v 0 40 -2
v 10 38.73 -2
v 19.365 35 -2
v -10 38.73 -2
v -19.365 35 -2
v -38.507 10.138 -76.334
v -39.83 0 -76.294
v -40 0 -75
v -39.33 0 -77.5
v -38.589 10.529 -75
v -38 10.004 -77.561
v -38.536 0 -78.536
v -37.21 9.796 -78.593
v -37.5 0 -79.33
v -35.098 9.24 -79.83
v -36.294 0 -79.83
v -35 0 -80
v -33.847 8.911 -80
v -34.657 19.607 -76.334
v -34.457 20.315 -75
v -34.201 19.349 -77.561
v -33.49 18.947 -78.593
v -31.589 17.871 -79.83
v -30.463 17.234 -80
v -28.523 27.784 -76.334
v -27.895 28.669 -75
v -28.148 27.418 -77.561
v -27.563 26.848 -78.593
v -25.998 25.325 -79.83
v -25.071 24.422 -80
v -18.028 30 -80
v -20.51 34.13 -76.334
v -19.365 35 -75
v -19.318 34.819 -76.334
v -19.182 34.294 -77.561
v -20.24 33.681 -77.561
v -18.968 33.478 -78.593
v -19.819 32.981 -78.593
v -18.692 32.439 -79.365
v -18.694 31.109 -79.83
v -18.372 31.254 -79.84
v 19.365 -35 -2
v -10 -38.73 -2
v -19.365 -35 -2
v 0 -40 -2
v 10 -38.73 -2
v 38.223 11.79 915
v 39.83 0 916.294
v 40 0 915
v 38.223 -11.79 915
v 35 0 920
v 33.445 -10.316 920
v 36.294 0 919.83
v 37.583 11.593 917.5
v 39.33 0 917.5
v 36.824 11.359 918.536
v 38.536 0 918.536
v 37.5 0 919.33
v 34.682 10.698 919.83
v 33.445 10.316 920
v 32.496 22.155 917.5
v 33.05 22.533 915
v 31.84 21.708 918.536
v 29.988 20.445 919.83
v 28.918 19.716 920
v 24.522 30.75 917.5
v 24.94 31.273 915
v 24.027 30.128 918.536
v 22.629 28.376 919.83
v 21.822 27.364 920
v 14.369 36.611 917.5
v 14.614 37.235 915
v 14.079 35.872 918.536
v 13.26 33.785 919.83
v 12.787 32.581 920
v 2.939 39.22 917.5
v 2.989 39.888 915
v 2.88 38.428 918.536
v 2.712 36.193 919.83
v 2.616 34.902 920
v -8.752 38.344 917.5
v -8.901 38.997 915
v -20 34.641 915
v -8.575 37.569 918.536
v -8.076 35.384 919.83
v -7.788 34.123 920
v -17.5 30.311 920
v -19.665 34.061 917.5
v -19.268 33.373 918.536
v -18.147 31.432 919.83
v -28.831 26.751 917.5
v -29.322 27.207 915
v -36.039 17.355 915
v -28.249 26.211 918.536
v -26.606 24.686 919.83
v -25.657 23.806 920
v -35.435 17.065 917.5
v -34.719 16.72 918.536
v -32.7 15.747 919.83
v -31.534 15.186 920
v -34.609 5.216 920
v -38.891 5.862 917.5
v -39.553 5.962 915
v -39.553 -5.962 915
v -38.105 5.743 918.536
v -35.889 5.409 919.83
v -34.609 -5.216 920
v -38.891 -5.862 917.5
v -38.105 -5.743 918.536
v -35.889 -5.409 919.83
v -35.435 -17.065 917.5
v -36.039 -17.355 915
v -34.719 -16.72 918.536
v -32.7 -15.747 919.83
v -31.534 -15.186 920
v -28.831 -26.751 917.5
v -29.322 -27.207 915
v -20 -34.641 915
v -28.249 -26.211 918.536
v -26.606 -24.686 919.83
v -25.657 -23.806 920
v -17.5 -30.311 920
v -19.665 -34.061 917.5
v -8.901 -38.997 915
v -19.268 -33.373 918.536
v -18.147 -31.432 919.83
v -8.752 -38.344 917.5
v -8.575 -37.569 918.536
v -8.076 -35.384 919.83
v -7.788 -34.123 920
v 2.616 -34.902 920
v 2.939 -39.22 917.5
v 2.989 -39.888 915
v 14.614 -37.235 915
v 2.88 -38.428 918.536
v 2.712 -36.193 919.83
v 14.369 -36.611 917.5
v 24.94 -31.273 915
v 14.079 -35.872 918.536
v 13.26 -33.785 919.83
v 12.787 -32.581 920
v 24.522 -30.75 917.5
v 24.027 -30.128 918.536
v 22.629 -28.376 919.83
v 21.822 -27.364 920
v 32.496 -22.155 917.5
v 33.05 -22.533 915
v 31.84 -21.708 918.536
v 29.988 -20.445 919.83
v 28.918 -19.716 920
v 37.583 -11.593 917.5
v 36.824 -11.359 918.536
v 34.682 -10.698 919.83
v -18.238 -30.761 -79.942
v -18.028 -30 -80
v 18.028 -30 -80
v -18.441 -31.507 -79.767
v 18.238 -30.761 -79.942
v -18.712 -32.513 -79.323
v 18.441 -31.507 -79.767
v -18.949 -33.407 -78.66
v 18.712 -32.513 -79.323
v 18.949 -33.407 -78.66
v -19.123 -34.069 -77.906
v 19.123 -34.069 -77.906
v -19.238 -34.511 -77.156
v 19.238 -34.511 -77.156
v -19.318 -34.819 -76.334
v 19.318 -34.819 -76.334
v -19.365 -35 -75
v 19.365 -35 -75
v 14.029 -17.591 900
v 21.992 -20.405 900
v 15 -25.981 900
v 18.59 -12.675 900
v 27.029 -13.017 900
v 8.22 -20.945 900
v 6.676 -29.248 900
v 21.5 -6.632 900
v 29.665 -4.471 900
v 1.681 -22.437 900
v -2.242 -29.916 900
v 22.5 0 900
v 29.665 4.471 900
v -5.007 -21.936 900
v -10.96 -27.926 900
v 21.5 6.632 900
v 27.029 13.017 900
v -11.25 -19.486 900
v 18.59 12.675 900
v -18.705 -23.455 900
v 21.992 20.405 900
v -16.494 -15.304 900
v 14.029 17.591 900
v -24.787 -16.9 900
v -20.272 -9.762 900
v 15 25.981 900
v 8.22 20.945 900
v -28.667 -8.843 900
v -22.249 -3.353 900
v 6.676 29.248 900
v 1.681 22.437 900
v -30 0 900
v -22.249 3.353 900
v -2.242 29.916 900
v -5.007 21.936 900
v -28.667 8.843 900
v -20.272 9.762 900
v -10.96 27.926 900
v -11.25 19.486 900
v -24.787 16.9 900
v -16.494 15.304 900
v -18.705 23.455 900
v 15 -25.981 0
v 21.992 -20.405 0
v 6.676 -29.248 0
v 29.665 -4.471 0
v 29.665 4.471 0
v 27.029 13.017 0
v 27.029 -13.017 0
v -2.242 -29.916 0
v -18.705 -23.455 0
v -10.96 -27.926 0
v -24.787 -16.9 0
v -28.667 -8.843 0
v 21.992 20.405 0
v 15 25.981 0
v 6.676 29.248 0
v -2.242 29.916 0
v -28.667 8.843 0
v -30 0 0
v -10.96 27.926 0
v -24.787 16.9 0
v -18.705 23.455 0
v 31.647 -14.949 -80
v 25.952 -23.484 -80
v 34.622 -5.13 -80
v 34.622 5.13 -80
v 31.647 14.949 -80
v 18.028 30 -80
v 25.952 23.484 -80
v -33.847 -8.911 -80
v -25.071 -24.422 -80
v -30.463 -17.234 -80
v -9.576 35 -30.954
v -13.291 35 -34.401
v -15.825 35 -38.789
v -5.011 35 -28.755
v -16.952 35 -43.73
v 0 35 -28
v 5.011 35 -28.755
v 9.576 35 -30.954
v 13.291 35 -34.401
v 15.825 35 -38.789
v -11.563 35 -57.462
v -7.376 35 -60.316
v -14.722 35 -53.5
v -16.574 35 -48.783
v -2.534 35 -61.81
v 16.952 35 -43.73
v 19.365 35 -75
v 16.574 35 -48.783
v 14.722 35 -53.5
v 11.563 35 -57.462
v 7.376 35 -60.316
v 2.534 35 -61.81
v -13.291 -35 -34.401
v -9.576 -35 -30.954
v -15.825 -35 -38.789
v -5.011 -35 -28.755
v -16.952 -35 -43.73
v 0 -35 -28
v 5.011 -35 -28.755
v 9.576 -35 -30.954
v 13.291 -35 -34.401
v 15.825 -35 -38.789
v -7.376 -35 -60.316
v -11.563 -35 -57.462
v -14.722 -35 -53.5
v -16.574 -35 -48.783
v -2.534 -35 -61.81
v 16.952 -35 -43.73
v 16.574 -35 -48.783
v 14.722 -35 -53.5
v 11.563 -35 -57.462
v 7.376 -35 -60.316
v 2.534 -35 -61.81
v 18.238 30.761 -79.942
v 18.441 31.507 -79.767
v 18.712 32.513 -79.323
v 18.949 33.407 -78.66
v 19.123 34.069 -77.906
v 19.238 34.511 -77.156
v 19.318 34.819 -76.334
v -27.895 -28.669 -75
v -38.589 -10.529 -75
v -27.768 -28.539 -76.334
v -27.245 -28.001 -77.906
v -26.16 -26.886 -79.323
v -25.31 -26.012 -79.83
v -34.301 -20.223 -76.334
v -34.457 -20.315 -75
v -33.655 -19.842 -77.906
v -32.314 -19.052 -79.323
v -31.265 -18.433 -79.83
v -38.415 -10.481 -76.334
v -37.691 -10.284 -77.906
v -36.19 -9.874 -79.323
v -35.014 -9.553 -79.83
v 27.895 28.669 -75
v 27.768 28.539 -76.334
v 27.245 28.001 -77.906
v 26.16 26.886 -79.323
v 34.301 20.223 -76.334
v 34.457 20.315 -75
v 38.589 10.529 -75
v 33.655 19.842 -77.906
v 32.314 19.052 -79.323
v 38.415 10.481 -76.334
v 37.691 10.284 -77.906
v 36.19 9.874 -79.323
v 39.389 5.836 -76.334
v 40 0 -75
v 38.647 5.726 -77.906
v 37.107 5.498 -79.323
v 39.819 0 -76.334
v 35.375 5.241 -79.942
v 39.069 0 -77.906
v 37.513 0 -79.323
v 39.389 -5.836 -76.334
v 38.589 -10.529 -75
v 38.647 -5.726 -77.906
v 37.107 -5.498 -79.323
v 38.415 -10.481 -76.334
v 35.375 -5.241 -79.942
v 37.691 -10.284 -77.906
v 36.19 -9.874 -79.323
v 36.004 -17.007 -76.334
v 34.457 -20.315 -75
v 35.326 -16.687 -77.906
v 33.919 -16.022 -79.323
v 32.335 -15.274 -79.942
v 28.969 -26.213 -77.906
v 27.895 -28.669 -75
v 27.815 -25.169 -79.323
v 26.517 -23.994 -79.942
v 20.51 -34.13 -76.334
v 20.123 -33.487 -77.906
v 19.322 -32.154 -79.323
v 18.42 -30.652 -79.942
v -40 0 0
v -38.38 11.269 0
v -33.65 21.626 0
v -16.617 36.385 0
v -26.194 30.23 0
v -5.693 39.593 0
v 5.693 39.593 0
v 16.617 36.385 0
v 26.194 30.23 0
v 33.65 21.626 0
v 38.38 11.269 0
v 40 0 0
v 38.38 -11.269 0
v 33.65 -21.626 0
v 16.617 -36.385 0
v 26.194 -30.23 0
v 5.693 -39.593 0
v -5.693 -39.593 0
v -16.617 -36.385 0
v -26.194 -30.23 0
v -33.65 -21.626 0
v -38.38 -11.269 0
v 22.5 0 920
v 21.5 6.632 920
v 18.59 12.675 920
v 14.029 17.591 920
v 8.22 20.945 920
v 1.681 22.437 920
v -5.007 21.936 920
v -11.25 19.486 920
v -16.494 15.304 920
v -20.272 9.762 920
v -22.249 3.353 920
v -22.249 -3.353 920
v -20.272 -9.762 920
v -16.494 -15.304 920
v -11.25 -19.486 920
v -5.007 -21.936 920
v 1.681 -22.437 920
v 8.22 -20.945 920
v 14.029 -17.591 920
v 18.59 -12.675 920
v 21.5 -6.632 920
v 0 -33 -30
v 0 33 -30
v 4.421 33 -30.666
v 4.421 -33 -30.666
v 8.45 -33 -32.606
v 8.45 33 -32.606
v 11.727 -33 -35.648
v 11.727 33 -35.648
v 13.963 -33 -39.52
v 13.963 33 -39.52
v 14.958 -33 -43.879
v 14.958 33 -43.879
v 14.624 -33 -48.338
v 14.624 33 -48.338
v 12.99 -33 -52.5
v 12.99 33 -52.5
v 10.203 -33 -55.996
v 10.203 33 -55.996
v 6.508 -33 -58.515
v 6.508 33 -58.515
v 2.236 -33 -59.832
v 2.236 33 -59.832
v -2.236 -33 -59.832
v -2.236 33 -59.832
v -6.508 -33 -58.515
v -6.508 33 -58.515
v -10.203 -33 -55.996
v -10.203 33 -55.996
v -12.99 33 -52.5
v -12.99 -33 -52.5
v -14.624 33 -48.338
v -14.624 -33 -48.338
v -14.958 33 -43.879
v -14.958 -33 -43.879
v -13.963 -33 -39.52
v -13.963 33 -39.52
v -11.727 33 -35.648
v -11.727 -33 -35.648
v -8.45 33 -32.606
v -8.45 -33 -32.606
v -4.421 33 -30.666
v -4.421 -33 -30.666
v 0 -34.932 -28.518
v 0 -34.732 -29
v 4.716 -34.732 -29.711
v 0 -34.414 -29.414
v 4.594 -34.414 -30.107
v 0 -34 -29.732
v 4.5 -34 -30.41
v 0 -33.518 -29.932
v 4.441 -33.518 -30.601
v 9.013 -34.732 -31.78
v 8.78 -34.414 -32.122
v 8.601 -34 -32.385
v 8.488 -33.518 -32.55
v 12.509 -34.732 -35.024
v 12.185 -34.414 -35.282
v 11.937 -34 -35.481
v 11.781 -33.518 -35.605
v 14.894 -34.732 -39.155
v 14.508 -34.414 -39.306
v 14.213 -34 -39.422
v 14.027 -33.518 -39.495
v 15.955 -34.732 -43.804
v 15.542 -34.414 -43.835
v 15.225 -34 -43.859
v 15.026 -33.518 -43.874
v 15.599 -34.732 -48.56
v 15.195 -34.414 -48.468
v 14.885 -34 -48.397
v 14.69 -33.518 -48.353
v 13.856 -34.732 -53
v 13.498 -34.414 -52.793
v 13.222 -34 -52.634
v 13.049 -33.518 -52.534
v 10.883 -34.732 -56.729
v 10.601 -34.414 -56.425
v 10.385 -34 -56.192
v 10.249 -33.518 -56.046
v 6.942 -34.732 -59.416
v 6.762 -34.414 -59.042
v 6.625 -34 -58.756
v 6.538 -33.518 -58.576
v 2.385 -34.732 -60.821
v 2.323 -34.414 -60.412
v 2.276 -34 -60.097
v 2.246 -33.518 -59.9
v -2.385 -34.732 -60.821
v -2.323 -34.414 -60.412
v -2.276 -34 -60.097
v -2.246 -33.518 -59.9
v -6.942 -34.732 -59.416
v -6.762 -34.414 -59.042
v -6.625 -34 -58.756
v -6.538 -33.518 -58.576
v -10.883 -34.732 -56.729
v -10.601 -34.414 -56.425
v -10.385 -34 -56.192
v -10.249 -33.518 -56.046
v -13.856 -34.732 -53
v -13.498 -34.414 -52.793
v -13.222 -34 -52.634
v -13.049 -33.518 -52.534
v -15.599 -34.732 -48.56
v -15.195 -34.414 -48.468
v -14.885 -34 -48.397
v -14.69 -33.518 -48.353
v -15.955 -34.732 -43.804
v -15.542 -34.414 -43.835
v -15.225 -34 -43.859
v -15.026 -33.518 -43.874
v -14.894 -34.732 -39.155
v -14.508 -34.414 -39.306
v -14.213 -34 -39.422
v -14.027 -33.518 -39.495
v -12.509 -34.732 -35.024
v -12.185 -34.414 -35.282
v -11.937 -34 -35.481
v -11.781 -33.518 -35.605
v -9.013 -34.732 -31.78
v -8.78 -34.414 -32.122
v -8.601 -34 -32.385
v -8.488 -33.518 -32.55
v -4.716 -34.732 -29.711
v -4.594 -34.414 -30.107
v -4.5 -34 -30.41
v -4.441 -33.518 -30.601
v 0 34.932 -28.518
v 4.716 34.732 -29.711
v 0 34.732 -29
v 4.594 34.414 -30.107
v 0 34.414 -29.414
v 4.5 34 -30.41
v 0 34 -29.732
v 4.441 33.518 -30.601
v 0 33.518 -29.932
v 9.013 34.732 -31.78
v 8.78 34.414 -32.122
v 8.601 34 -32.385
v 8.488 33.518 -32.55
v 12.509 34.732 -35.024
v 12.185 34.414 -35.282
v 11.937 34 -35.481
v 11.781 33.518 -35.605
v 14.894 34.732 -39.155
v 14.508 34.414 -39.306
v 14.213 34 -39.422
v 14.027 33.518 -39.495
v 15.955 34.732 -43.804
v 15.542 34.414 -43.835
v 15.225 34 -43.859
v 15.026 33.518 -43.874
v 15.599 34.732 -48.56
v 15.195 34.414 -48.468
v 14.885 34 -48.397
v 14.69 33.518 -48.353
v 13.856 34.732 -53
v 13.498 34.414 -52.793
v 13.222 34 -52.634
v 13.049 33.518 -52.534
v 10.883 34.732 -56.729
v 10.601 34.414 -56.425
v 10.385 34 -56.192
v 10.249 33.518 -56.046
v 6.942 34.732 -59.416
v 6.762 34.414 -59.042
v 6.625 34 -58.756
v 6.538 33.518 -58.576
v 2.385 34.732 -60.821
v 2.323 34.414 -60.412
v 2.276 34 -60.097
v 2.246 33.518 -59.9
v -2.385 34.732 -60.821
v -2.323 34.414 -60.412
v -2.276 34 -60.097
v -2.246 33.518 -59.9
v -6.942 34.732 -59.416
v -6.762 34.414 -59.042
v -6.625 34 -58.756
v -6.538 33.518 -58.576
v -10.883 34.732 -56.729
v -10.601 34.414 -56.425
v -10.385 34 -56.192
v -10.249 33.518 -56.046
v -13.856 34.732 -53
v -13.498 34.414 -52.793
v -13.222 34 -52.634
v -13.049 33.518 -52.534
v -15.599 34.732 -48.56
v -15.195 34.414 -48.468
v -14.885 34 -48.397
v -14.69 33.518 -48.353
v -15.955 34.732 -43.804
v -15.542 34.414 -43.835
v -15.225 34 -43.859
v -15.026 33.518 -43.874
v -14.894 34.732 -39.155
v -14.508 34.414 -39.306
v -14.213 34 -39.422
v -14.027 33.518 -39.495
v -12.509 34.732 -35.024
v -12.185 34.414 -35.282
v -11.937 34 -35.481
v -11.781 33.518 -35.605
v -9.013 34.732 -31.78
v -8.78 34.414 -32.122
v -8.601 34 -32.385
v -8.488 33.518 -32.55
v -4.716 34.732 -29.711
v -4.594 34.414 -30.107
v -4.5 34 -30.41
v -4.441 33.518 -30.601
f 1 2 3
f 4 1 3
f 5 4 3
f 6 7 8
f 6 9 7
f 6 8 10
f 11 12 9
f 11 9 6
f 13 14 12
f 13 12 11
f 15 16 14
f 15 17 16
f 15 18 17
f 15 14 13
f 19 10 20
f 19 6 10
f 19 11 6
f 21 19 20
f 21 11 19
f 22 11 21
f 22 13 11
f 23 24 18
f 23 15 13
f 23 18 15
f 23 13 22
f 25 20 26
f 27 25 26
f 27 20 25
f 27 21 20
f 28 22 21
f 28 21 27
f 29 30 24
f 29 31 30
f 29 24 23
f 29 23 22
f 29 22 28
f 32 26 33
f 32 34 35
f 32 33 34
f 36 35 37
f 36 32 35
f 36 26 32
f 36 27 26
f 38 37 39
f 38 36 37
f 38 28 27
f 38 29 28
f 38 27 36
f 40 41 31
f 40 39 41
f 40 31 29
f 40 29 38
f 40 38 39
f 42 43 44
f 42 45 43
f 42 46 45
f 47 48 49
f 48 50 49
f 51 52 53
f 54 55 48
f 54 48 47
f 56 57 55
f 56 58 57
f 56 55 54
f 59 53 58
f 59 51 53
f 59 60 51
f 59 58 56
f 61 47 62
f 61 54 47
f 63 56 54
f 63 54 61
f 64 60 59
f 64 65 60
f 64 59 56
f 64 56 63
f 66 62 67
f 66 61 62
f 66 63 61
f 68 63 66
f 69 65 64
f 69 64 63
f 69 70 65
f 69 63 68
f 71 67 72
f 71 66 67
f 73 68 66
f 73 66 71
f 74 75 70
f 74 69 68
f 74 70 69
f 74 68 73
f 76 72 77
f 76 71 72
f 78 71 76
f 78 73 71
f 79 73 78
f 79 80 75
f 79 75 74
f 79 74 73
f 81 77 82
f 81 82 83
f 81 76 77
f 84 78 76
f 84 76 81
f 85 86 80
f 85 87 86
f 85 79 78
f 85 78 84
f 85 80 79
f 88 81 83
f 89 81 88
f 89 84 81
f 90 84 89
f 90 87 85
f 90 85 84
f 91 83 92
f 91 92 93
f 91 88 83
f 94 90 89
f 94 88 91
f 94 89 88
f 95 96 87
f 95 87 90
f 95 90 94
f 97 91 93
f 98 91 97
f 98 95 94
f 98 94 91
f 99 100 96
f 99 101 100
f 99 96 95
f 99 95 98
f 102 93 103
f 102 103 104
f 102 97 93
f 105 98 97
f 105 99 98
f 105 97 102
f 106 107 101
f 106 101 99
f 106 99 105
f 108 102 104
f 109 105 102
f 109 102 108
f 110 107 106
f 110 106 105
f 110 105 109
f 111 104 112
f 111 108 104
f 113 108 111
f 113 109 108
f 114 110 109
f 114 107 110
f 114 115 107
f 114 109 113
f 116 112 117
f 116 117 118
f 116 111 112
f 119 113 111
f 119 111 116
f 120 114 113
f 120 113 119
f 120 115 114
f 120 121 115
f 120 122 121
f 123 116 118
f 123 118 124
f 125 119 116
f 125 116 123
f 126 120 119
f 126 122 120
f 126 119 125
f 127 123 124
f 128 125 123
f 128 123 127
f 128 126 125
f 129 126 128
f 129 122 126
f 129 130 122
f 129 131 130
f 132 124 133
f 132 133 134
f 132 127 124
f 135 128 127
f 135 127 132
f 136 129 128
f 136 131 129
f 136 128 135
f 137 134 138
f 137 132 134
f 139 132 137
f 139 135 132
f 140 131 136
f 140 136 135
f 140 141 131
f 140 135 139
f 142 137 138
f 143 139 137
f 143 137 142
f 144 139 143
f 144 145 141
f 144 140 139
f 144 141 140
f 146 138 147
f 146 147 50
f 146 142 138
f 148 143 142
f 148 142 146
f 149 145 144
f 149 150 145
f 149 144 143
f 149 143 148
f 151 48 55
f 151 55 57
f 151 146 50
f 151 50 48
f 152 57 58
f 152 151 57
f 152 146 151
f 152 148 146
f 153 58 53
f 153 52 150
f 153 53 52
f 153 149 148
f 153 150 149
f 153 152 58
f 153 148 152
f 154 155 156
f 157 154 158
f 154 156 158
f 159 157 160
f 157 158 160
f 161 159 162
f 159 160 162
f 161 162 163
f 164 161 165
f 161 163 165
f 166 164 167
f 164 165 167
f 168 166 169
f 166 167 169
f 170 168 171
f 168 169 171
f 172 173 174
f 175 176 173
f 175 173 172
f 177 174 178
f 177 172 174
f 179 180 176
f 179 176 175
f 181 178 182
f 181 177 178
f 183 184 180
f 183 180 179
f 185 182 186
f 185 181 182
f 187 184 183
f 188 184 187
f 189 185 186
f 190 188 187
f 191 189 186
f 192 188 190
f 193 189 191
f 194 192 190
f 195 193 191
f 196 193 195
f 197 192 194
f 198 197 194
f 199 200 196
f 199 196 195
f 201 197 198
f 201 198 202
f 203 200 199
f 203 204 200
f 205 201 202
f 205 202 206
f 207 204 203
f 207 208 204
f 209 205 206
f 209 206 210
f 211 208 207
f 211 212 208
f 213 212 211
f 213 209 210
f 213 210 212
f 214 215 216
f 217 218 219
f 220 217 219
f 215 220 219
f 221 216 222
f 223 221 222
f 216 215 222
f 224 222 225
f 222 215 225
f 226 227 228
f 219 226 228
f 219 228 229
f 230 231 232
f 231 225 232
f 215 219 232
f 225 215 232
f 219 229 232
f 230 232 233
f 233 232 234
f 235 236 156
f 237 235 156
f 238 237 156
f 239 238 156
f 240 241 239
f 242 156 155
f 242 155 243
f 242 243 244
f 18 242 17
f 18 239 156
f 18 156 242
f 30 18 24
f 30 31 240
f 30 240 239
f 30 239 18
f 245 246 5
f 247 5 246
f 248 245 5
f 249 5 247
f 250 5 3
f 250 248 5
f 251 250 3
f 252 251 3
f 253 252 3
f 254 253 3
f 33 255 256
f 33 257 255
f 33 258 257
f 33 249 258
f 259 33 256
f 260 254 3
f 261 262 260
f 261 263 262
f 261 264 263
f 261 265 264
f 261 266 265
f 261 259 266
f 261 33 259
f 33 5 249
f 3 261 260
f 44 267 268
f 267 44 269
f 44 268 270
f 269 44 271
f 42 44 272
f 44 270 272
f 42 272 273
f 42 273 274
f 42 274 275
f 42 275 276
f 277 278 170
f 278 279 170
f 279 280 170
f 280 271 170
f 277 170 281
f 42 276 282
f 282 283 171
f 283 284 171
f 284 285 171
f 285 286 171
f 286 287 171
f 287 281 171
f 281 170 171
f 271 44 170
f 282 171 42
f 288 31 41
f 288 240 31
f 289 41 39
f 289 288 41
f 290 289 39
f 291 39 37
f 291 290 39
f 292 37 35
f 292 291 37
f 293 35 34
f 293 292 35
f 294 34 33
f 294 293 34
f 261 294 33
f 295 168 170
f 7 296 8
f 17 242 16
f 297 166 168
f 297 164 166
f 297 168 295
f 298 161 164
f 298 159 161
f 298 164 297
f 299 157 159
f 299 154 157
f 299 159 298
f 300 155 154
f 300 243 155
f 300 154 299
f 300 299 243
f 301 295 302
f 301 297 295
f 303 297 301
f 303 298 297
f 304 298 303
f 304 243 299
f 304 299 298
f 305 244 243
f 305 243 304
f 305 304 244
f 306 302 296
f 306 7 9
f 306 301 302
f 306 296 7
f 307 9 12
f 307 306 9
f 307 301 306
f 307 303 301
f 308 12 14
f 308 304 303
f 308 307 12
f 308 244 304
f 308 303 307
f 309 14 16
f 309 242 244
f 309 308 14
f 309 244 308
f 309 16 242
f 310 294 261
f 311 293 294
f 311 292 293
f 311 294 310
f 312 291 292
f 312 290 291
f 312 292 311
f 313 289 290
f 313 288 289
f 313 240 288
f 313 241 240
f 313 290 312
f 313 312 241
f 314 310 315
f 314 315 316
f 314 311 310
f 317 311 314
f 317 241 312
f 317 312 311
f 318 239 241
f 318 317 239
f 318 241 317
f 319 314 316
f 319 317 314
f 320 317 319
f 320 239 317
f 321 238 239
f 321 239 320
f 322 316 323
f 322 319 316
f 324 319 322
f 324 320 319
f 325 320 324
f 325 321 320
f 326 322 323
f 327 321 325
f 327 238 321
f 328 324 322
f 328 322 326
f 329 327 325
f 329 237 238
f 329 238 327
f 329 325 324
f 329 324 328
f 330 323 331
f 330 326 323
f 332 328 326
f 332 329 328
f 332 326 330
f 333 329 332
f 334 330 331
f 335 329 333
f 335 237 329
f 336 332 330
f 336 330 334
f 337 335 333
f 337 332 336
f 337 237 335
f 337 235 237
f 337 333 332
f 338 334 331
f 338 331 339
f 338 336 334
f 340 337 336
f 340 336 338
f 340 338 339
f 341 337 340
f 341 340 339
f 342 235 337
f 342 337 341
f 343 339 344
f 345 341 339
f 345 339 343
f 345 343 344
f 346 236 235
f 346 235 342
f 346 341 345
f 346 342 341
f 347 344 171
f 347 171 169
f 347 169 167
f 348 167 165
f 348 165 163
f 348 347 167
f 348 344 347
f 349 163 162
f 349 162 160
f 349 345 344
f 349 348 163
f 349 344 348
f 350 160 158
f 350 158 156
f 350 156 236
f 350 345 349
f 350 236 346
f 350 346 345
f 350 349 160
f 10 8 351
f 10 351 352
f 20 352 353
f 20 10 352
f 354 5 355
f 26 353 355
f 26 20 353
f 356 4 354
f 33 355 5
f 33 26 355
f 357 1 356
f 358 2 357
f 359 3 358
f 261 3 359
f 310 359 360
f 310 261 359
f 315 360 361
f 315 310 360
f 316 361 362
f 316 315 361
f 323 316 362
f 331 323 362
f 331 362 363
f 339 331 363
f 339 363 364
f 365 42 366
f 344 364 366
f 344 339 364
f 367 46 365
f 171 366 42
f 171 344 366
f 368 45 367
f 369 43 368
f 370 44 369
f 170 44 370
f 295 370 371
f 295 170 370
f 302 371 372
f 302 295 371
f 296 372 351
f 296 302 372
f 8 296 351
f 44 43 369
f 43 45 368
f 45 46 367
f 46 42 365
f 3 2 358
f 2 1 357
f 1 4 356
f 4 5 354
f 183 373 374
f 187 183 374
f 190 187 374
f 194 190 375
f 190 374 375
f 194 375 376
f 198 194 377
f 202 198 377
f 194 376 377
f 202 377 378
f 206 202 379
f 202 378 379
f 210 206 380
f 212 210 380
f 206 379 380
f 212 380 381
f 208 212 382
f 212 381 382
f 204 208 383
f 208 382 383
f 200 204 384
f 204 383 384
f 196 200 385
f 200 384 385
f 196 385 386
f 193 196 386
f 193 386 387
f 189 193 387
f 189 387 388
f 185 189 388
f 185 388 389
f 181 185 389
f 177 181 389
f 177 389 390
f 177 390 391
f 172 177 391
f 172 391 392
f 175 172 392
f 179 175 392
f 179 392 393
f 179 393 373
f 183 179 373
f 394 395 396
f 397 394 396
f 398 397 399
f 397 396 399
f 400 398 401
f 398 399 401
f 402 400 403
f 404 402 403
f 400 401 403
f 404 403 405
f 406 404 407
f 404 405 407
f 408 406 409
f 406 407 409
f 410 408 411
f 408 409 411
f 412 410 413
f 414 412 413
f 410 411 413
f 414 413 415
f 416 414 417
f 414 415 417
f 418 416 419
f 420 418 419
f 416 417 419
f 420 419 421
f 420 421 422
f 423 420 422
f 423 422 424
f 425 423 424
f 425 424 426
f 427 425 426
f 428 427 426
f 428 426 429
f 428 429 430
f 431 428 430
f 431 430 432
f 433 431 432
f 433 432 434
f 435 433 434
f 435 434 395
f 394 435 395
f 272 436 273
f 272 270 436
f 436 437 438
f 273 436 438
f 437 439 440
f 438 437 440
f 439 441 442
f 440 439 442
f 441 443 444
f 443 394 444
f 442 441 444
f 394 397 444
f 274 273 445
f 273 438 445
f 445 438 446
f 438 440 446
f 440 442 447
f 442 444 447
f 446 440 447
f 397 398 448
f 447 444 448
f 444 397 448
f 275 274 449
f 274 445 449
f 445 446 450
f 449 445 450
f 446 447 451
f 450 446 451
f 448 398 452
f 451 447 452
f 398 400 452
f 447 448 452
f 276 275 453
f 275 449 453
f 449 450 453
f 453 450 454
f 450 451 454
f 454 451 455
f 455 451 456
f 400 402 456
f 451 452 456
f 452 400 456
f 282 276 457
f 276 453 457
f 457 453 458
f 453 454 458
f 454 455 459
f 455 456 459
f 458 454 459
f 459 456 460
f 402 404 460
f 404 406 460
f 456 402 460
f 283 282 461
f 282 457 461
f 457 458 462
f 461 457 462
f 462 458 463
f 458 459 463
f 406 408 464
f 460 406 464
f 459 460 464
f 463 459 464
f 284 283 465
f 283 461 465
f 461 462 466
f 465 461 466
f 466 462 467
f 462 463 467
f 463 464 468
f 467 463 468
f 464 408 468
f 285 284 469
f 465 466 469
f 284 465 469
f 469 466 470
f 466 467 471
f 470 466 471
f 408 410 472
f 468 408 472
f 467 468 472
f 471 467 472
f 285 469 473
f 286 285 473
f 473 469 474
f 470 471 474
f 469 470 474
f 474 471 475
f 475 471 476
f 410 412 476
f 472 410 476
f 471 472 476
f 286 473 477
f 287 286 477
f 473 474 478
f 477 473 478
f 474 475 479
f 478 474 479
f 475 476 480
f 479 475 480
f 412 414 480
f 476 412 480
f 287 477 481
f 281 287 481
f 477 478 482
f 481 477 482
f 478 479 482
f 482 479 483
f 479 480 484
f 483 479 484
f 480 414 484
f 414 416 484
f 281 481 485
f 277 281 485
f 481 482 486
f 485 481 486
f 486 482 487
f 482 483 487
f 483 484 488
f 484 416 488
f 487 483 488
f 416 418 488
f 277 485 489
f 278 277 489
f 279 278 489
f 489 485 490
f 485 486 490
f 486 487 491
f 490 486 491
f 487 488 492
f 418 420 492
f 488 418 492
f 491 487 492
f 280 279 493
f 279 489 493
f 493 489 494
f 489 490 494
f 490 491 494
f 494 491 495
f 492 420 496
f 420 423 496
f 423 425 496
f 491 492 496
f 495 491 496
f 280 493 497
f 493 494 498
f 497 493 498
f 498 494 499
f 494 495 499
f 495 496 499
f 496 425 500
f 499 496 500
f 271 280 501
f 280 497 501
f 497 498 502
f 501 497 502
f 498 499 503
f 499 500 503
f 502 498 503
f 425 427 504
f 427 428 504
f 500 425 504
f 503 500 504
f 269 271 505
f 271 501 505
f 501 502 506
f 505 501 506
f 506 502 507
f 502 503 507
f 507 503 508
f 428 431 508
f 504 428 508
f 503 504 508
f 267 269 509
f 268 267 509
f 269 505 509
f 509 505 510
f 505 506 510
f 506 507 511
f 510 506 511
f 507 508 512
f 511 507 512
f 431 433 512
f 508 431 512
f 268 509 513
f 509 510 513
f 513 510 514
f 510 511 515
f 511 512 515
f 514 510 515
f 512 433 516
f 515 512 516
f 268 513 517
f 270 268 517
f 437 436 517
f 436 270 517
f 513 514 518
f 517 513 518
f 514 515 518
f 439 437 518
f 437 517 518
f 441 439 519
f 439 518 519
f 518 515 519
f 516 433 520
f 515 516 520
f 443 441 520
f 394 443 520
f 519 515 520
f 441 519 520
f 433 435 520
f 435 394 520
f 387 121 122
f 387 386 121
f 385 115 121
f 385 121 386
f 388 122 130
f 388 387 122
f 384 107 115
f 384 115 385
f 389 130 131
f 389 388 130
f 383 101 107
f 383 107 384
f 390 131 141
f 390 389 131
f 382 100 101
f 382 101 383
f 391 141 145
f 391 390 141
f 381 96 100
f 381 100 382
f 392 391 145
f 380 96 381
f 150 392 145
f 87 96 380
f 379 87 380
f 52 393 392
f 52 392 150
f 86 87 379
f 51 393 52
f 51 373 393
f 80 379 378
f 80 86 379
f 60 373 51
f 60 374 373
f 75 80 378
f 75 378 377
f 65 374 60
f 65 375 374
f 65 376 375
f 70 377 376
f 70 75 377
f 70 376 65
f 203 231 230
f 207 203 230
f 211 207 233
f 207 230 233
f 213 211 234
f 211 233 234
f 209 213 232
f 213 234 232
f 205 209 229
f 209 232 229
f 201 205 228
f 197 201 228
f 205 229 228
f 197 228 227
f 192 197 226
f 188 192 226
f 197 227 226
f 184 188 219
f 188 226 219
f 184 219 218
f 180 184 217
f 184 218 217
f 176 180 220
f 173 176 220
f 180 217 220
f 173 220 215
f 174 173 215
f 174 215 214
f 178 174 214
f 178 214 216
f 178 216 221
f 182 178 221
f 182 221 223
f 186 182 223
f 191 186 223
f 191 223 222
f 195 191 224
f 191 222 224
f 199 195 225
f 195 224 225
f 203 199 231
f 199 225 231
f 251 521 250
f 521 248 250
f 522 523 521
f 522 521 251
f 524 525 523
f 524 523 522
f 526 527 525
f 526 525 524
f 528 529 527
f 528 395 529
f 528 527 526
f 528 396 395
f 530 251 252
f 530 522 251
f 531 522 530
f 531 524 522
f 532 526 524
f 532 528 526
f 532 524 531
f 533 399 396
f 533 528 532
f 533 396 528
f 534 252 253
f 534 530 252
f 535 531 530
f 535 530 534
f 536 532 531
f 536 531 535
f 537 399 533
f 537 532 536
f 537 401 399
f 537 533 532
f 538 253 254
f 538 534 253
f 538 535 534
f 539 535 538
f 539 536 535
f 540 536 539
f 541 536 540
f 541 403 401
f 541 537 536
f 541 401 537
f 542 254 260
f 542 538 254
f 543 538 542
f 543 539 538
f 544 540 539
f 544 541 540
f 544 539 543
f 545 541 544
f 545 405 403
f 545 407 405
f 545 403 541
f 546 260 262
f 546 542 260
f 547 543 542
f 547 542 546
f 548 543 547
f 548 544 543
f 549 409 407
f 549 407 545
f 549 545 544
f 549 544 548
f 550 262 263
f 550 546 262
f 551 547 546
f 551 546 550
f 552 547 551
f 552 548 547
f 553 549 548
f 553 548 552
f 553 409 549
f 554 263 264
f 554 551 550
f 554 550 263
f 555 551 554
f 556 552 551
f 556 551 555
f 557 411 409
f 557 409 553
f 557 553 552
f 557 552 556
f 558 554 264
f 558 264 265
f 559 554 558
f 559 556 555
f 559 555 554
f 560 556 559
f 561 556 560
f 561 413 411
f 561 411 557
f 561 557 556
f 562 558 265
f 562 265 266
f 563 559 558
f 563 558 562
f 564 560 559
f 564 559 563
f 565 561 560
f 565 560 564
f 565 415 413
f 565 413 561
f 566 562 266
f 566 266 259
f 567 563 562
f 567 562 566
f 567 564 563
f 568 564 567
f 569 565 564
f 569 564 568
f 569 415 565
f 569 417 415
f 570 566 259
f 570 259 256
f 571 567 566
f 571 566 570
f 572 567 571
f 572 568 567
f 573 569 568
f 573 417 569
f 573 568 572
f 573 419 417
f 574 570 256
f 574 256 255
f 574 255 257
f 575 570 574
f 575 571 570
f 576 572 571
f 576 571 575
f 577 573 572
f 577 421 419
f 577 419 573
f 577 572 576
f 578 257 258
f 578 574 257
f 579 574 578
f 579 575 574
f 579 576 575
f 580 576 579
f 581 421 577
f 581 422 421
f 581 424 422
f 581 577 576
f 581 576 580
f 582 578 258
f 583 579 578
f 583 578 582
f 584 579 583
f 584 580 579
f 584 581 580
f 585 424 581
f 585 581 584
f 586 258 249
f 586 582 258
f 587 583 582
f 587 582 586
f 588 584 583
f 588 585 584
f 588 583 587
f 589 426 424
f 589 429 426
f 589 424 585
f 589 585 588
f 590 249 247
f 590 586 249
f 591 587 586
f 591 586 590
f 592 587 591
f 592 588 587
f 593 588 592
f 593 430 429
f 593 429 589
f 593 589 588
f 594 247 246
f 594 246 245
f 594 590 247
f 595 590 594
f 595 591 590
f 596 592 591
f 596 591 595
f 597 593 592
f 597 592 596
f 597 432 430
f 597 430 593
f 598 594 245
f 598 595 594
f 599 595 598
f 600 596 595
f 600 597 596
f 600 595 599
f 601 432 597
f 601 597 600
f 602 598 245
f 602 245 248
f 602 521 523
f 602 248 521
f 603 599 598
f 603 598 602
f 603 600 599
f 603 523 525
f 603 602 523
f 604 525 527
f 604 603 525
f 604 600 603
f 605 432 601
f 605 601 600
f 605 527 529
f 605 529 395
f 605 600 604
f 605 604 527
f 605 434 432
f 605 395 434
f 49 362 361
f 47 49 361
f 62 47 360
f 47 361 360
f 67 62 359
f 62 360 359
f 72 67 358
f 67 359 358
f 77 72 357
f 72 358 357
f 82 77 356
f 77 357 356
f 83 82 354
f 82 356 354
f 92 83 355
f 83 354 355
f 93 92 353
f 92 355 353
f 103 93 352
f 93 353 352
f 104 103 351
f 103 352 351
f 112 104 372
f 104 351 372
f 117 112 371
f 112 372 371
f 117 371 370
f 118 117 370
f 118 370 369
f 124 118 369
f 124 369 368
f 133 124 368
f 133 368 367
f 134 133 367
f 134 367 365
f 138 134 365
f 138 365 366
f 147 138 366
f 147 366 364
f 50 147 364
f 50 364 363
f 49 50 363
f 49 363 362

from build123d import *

# Parameters (mm, degrees)
SKETCH2_R           = 40
BOSS_EXTRUDE1_DEPTH = 920
SKETCH3_R           = 30
CUT_EXTRUDE1_DEPTH  = 900
CUT_EXTRUDE2_REACH  = 923.737
SKETCH4_R           = 22.5
BOSS_EXTRUDE2_START = 80
SKETCH5_R           = 40
BOSS_EXTRUDE2_DEPTH = 80
SKETCH6_W           = 40
SKETCH6_H           = 78
CUT_EXTRUDE3_DEPTH  = 5
SKETCH7_R           = 15
CUT_EXTRUDE4_DEPTH  = 924.91828643
FILLET2_R           = 5
FILLET3_R           = 2


with BuildPart() as part:
    # Sketch2 → Boss-Extrude1 (new body)
    with BuildSketch(Plane.XY):
        Circle(SKETCH2_R)
    extrude(amount=BOSS_EXTRUDE1_DEPTH)

    # Sketch3 → Cut-Extrude1 (cut)
    with BuildSketch(Plane(origin=(0, 0, 0), x_dir=(-1, 0, 0), z_dir=(0, 0, -1))):
        Circle(SKETCH3_R)
    extrude(amount=-CUT_EXTRUDE1_DEPTH, mode=Mode.SUBTRACT)

    # Sketch4 → Cut-Extrude2 (cut, up to next)
    with BuildSketch(Plane.XY.offset(920), mode=Mode.PRIVATE) as cut_extrude2_sk1:
        Circle(SKETCH4_R)
    cut_extrude2_tool1 = extrude(cut_extrude2_sk1.sketch, amount=-CUT_EXTRUDE2_REACH, mode=Mode.PRIVATE) & part.part
    add(cut_extrude2_tool1.solids().sort_by_distance((0, 0, 920))[0], mode=Mode.SUBTRACT)

    # Sketch5 → Boss-Extrude2 (add)
    with BuildSketch(Plane(origin=(0, 0, 0), x_dir=(-1, 0, 0), z_dir=(0, 0, -1)).offset(BOSS_EXTRUDE2_START)):
        Circle(SKETCH5_R)
    extrude(amount=-BOSS_EXTRUDE2_DEPTH)

    # Sketch6 → Cut-Extrude3 (cut)
    with BuildSketch(Plane(origin=(0, 40, 0), x_dir=(1, 0, 0), z_dir=(0, 1, 0))):
        with Locations((0, 41)):
            Rectangle(SKETCH6_W, SKETCH6_H)
    cut_extrude3 = extrude(amount=-CUT_EXTRUDE3_DEPTH, mode=Mode.SUBTRACT)

    # Mirror1: Cut-Extrude3 across plane
    add(cut_extrude3.mirror(Plane.ZX), mode=Mode.SUBTRACT)

    # Sketch7 → Cut-Extrude4 (cut, through all)
    with BuildSketch(Plane(origin=(0, 35, 0), x_dir=(1, 0, 0), z_dir=(0, 1, 0))):
        with Locations(Location((0, 45, 0), (0, 0, 270))):
            Circle(SKETCH7_R)
    extrude(amount=-CUT_EXTRUDE4_DEPTH, mode=Mode.SUBTRACT)

    # Fillet2
    fillet2_edges = [part.edges().sort_by_distance(p)[0] for p in [
        (40, 0, -80),
        (0, 35, -80),
        (-34.457195687, 20.315060063, -80),
        (0, -35, -80),
        (-40, 0, 920),
    ]]
    fillet(fillet2_edges, radius=FILLET2_R - 0.0001)  # a hair under: the kernel refuses the full size

    # Fillet3
    fillet3_edges = [part.edges().sort_by_distance(p)[0] for p in [
        (0, -35, -60),
        (0, 35, -60),
    ]]
    fillet(fillet3_edges, radius=FILLET3_R)


solid = part.part
